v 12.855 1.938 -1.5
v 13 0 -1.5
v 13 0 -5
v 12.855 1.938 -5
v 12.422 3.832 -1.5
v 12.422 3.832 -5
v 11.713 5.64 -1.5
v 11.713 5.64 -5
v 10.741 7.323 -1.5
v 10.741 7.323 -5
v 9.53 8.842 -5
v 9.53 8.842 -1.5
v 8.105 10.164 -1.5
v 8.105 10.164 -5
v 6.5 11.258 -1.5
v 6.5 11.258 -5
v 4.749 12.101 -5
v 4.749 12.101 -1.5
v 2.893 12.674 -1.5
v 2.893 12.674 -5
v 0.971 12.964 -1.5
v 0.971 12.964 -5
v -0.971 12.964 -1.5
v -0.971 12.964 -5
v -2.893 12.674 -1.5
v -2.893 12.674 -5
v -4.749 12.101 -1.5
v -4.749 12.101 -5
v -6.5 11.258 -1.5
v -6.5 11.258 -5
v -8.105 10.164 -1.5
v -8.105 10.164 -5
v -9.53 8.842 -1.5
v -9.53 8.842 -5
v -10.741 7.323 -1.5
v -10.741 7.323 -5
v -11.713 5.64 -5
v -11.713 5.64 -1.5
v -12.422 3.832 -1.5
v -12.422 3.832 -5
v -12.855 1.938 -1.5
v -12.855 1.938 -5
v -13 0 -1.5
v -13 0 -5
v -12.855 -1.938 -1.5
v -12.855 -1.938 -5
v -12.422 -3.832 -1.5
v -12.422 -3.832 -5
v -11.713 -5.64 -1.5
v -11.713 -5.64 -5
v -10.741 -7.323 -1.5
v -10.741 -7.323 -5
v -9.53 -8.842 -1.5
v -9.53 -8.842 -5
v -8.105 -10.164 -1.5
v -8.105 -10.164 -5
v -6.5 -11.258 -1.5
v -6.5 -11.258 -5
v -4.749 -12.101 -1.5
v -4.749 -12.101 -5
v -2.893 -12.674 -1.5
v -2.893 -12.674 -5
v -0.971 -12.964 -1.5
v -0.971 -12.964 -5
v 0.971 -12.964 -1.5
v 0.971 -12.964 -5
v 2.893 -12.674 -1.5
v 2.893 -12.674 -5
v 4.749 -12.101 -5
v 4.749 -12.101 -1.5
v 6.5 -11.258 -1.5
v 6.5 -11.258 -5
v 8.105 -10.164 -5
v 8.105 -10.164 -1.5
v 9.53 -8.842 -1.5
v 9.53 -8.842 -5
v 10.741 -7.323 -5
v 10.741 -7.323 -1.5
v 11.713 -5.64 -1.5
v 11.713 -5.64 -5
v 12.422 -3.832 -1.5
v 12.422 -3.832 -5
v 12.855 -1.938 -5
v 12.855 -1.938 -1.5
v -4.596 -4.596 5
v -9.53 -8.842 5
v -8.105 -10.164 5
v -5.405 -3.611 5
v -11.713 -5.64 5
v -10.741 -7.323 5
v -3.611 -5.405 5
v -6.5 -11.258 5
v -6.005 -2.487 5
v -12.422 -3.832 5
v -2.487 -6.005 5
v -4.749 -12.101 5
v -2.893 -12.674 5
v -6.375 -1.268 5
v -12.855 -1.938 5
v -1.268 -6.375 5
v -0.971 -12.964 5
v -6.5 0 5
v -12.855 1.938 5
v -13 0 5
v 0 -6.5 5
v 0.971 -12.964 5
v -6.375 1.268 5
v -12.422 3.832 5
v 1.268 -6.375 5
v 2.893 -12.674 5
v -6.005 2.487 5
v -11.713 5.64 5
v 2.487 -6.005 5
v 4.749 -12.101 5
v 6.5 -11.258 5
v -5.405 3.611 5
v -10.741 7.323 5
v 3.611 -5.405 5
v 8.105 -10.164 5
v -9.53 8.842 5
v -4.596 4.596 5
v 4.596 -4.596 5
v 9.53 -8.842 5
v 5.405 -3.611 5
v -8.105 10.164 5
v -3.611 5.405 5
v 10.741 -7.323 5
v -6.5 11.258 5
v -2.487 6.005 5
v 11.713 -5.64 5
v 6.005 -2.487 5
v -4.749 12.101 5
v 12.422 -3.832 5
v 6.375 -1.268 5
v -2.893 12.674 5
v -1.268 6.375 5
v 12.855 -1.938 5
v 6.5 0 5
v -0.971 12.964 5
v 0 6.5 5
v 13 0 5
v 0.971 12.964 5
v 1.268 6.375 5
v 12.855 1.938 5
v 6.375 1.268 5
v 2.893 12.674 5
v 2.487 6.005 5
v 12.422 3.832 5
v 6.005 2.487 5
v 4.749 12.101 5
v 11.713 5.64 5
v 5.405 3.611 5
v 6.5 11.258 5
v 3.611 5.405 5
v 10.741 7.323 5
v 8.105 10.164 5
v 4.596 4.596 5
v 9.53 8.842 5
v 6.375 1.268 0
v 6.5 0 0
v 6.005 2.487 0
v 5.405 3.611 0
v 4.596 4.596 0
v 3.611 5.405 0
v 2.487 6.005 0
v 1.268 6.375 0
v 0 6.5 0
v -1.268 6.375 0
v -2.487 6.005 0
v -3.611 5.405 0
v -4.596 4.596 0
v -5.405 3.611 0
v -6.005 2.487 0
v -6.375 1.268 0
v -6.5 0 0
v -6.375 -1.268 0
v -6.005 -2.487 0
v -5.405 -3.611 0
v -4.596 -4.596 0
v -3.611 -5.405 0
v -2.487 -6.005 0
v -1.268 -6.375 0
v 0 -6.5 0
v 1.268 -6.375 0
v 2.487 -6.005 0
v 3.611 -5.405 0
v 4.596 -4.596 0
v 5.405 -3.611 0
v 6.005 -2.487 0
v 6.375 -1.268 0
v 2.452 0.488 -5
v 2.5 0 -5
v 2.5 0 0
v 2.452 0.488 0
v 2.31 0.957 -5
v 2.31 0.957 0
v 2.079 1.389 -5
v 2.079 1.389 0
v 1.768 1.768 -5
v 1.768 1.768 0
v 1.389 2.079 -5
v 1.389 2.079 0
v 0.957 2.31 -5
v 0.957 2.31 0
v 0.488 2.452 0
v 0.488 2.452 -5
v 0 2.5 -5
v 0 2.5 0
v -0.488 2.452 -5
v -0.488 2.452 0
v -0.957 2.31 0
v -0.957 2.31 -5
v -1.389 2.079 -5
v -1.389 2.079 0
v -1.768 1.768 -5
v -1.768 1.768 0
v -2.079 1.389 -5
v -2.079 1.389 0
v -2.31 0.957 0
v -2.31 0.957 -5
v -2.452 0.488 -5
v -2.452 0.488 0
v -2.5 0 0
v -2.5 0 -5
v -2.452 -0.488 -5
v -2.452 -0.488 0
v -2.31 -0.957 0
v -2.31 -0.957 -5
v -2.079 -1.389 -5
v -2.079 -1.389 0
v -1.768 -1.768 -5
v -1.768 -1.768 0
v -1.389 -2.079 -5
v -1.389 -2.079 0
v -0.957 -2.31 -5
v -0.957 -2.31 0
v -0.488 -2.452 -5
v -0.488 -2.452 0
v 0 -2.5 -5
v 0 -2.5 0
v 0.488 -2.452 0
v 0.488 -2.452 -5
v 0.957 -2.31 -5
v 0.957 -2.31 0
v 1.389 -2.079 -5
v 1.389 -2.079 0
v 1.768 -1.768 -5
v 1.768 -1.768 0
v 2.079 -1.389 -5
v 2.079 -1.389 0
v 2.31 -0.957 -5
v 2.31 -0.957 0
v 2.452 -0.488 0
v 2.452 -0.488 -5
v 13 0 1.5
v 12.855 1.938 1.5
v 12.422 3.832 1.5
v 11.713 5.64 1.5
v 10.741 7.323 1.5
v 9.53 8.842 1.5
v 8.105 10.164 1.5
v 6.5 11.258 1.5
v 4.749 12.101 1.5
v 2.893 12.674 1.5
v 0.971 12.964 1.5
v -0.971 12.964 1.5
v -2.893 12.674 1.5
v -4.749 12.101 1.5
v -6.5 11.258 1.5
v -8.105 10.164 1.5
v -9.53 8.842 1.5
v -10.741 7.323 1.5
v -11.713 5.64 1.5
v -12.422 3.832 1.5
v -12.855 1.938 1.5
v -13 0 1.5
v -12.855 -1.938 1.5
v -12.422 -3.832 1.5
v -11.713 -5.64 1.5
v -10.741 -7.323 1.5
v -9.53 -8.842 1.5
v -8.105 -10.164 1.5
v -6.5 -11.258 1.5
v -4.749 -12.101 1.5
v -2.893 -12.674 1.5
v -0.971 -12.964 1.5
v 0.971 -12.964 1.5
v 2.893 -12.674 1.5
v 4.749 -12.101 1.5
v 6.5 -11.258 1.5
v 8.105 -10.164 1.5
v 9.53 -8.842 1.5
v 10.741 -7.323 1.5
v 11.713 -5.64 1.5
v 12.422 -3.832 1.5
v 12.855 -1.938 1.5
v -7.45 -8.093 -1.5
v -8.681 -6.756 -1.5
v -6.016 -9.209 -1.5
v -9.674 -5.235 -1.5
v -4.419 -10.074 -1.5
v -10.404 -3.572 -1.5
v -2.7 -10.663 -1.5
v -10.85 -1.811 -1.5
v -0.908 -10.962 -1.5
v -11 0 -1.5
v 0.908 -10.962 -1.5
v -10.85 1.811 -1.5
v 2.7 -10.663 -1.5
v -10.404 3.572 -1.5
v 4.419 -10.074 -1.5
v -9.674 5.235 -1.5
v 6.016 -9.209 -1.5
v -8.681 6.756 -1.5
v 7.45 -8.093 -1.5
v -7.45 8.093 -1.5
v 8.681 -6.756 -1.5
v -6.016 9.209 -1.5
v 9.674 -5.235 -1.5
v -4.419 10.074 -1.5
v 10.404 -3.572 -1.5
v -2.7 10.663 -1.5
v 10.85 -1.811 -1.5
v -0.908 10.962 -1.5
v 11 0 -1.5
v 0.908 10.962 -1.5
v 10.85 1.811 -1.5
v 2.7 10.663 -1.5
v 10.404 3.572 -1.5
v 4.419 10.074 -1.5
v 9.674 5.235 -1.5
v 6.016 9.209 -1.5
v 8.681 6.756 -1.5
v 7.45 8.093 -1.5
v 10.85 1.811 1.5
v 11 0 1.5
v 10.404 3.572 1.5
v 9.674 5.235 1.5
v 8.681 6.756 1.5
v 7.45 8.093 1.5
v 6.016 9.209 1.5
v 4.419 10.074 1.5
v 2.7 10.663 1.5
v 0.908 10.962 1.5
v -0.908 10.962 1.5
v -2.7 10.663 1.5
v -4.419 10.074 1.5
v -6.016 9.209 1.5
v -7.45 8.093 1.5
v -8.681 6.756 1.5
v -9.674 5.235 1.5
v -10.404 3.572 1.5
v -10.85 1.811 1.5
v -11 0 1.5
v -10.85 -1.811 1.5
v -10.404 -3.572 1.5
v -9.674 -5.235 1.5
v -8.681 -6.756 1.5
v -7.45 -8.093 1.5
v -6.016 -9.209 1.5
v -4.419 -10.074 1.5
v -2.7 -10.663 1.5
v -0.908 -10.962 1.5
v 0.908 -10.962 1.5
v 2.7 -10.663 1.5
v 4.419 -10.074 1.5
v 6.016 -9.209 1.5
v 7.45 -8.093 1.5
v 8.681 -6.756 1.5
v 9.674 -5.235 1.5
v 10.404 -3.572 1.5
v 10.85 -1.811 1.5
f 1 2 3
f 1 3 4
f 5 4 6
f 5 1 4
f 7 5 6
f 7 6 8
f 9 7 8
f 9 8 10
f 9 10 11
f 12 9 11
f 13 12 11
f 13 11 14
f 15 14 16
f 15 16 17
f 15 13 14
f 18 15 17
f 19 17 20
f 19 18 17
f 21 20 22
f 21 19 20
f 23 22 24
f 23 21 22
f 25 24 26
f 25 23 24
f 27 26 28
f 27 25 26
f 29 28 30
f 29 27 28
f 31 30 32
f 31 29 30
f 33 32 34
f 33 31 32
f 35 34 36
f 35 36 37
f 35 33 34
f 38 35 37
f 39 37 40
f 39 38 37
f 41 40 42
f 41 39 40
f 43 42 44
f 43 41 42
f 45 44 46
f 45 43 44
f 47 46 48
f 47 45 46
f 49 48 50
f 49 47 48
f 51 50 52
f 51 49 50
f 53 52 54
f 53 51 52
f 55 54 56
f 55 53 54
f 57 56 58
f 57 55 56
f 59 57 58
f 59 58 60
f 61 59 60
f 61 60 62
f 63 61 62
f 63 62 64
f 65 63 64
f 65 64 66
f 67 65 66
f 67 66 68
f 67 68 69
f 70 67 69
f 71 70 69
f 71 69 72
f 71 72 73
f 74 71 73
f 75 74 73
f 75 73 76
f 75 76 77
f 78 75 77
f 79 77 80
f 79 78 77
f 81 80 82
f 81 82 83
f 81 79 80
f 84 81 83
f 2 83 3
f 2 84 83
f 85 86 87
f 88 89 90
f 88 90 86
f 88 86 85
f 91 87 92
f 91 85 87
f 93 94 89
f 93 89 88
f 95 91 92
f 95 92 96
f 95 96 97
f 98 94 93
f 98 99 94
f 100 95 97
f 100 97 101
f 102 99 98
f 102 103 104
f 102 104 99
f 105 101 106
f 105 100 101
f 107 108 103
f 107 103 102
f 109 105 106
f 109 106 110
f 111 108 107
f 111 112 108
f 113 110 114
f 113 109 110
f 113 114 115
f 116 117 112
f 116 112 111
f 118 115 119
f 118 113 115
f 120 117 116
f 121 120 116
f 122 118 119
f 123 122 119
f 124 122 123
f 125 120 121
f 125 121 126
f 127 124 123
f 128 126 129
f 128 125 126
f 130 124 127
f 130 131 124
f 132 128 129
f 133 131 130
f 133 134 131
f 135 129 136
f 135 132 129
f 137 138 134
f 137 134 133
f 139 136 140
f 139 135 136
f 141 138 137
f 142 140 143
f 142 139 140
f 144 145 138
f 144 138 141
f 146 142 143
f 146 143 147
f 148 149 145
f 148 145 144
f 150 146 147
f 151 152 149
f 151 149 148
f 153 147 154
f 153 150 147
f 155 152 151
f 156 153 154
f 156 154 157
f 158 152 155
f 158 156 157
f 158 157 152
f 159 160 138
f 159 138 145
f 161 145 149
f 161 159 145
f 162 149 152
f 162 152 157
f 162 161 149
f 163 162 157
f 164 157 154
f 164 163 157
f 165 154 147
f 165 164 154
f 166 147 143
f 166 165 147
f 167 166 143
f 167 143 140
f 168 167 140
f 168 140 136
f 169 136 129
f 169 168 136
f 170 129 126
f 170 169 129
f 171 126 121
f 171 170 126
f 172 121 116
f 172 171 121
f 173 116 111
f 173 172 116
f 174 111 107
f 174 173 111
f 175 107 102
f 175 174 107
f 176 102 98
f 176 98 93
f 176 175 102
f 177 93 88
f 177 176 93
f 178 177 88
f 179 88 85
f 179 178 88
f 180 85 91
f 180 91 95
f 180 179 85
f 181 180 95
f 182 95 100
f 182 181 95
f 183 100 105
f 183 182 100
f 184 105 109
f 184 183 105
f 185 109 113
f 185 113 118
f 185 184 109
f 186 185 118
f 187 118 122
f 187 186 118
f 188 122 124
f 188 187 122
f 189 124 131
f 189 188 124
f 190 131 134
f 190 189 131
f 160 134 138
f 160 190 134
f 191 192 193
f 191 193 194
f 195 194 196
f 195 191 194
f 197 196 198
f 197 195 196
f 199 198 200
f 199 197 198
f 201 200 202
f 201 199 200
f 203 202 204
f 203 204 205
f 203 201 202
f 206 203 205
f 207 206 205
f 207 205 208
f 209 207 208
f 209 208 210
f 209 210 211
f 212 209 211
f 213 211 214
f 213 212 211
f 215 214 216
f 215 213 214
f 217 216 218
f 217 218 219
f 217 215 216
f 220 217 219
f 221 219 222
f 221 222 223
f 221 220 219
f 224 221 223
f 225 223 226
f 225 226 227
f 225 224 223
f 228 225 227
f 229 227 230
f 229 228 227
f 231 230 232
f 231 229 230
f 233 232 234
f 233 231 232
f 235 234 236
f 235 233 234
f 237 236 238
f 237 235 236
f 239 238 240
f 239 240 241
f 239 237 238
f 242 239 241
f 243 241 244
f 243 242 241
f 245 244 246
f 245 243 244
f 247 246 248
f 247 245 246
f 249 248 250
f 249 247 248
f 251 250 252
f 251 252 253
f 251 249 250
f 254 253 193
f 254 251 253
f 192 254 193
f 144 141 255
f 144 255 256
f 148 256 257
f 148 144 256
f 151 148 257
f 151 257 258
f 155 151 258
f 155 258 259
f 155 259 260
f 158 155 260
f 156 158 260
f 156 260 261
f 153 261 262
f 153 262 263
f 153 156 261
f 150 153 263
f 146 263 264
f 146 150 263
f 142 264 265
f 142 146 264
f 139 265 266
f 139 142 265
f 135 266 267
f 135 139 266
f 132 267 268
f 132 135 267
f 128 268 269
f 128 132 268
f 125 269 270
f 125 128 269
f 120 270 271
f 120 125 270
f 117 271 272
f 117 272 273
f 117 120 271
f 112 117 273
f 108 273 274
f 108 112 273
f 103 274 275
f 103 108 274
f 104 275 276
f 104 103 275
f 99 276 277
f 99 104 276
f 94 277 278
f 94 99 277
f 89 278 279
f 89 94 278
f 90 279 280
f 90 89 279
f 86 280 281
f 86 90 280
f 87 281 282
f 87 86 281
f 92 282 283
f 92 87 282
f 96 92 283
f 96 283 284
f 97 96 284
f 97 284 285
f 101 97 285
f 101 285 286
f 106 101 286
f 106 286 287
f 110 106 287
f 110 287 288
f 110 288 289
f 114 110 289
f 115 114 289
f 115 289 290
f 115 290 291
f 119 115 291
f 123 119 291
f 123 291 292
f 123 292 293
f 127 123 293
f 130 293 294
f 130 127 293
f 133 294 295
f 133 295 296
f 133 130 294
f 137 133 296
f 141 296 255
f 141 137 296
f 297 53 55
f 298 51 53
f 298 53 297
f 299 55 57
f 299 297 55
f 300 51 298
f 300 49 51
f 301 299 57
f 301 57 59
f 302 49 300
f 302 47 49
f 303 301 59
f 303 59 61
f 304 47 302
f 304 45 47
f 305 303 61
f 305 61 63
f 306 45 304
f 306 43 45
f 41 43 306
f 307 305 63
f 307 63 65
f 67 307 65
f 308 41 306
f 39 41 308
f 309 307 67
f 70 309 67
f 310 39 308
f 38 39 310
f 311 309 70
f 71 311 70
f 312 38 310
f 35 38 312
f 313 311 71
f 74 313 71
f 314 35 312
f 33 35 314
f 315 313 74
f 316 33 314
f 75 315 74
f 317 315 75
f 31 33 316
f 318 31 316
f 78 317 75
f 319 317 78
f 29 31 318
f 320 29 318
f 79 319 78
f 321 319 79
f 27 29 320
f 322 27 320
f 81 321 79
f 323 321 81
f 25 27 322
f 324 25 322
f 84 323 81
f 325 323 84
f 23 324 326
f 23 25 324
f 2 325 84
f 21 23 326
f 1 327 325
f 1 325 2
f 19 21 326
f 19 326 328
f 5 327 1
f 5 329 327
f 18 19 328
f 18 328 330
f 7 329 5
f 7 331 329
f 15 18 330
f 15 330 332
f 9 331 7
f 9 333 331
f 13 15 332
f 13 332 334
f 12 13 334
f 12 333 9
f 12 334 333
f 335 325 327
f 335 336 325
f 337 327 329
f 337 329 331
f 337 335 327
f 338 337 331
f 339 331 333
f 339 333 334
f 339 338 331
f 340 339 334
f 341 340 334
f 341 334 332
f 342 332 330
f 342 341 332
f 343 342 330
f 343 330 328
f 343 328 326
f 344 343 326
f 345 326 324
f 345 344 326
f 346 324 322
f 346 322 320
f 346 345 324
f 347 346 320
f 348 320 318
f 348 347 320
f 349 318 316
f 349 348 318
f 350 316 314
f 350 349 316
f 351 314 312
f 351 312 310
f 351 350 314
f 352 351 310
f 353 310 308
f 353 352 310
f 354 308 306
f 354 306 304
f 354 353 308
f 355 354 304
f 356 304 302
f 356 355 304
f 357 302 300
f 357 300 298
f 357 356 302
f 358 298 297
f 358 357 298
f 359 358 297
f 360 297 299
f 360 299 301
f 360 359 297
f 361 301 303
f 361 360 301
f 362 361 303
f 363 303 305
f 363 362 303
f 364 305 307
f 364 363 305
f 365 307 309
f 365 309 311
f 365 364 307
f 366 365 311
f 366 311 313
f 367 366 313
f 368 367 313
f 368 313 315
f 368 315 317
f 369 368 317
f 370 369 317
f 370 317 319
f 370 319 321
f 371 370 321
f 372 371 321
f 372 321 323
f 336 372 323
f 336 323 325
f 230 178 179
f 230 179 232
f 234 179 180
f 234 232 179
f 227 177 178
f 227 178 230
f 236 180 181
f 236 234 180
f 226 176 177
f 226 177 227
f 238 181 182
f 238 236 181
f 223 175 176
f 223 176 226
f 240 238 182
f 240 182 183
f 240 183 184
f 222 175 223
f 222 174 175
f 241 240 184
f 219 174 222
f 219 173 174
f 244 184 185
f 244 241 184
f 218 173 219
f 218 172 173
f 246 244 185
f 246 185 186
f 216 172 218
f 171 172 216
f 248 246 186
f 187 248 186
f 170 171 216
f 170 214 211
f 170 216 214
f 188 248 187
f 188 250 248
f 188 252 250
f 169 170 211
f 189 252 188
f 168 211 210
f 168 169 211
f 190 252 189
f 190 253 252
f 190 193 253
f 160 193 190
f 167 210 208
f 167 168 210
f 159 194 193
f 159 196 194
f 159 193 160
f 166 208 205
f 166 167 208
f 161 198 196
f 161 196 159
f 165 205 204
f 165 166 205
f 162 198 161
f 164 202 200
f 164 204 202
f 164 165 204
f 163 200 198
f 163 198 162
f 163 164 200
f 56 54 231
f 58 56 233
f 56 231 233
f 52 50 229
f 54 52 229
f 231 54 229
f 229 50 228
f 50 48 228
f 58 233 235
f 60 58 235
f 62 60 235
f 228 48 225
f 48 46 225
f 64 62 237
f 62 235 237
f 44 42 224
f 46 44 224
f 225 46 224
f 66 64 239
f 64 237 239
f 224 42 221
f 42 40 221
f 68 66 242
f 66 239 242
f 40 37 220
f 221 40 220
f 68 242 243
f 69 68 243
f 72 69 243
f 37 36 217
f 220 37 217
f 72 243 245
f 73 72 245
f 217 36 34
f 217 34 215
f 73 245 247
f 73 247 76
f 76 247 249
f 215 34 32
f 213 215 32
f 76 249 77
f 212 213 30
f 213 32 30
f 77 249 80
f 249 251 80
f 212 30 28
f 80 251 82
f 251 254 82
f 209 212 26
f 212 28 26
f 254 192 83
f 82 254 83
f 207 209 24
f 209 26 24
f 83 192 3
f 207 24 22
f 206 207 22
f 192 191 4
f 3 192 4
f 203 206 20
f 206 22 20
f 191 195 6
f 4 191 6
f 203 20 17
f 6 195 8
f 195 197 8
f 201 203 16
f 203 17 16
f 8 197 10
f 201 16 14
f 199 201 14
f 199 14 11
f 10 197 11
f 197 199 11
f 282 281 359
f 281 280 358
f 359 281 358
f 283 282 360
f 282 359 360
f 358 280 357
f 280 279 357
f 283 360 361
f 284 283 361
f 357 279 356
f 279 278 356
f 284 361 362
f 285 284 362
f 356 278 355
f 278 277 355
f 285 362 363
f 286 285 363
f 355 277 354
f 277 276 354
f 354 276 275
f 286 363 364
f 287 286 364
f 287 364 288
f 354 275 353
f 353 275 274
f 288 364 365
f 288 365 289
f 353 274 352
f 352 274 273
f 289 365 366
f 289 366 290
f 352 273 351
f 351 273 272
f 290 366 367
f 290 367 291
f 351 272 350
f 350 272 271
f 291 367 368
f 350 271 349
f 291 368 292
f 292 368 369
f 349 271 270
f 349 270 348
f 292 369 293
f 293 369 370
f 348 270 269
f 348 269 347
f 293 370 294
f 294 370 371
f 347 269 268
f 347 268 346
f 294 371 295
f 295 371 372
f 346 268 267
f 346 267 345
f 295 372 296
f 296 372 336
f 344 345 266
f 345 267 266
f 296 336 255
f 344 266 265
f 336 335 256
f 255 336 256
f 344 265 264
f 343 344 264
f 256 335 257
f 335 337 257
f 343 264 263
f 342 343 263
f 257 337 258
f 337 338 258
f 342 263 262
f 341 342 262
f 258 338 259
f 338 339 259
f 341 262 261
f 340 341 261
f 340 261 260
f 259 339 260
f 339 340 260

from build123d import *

# Parameters (mm, degrees)
SKETCH1_R           = 11
SKETCH1_R_2         = 6.5
BOSS_EXTRUDE1_DEPTH = 5
BOSS_EXTRUDE2_START = 5
SKETCH1_3_R         = 13
SKETCH1_3_R_2       = 11
BOSS_EXTRUDE2_DEPTH = 3.5
BOSS_EXTRUDE3_START = -5
SKETCH1_5_R         = 6.5
SKETCH1_5_R_2       = 2.5
BOSS_EXTRUDE3_DEPTH = 5
BOSS_EXTRUDE4_START = -1.5
SKETCH1_6_R         = 13
SKETCH1_6_R_2       = 11
BOSS_EXTRUDE4_DEPTH = 3.5


with BuildPart() as part:
    # Sketch1 → Boss-Extrude1 (new, symmetric)
    with BuildSketch(Plane.XY):
        Circle(SKETCH1_R)
        Circle(SKETCH1_R_2, mode=Mode.SUBTRACT)
    extrude(amount=BOSS_EXTRUDE1_DEPTH, both=True)

    # Sketch1<3> → Boss-Extrude2 (add)
    with BuildSketch(Plane.XY.offset(BOSS_EXTRUDE2_START)):
        Circle(SKETCH1_3_R)
        Circle(SKETCH1_3_R_2, mode=Mode.SUBTRACT)
    extrude(amount=-BOSS_EXTRUDE2_DEPTH)

    # Sketch1<5> → Boss-Extrude3 (add)
    with BuildSketch(Plane.XY.offset(BOSS_EXTRUDE3_START)):
        Circle(SKETCH1_5_R)
        Circle(SKETCH1_5_R_2, mode=Mode.SUBTRACT)
    extrude(amount=BOSS_EXTRUDE3_DEPTH)

    # Sketch1<6> → Boss-Extrude4 (add)
    with BuildSketch(Plane.XY.offset(BOSS_EXTRUDE4_START)):
        Circle(SKETCH1_6_R)
        Circle(SKETCH1_6_R_2, mode=Mode.SUBTRACT)
    extrude(amount=-BOSS_EXTRUDE4_DEPTH)


solid = part.part
